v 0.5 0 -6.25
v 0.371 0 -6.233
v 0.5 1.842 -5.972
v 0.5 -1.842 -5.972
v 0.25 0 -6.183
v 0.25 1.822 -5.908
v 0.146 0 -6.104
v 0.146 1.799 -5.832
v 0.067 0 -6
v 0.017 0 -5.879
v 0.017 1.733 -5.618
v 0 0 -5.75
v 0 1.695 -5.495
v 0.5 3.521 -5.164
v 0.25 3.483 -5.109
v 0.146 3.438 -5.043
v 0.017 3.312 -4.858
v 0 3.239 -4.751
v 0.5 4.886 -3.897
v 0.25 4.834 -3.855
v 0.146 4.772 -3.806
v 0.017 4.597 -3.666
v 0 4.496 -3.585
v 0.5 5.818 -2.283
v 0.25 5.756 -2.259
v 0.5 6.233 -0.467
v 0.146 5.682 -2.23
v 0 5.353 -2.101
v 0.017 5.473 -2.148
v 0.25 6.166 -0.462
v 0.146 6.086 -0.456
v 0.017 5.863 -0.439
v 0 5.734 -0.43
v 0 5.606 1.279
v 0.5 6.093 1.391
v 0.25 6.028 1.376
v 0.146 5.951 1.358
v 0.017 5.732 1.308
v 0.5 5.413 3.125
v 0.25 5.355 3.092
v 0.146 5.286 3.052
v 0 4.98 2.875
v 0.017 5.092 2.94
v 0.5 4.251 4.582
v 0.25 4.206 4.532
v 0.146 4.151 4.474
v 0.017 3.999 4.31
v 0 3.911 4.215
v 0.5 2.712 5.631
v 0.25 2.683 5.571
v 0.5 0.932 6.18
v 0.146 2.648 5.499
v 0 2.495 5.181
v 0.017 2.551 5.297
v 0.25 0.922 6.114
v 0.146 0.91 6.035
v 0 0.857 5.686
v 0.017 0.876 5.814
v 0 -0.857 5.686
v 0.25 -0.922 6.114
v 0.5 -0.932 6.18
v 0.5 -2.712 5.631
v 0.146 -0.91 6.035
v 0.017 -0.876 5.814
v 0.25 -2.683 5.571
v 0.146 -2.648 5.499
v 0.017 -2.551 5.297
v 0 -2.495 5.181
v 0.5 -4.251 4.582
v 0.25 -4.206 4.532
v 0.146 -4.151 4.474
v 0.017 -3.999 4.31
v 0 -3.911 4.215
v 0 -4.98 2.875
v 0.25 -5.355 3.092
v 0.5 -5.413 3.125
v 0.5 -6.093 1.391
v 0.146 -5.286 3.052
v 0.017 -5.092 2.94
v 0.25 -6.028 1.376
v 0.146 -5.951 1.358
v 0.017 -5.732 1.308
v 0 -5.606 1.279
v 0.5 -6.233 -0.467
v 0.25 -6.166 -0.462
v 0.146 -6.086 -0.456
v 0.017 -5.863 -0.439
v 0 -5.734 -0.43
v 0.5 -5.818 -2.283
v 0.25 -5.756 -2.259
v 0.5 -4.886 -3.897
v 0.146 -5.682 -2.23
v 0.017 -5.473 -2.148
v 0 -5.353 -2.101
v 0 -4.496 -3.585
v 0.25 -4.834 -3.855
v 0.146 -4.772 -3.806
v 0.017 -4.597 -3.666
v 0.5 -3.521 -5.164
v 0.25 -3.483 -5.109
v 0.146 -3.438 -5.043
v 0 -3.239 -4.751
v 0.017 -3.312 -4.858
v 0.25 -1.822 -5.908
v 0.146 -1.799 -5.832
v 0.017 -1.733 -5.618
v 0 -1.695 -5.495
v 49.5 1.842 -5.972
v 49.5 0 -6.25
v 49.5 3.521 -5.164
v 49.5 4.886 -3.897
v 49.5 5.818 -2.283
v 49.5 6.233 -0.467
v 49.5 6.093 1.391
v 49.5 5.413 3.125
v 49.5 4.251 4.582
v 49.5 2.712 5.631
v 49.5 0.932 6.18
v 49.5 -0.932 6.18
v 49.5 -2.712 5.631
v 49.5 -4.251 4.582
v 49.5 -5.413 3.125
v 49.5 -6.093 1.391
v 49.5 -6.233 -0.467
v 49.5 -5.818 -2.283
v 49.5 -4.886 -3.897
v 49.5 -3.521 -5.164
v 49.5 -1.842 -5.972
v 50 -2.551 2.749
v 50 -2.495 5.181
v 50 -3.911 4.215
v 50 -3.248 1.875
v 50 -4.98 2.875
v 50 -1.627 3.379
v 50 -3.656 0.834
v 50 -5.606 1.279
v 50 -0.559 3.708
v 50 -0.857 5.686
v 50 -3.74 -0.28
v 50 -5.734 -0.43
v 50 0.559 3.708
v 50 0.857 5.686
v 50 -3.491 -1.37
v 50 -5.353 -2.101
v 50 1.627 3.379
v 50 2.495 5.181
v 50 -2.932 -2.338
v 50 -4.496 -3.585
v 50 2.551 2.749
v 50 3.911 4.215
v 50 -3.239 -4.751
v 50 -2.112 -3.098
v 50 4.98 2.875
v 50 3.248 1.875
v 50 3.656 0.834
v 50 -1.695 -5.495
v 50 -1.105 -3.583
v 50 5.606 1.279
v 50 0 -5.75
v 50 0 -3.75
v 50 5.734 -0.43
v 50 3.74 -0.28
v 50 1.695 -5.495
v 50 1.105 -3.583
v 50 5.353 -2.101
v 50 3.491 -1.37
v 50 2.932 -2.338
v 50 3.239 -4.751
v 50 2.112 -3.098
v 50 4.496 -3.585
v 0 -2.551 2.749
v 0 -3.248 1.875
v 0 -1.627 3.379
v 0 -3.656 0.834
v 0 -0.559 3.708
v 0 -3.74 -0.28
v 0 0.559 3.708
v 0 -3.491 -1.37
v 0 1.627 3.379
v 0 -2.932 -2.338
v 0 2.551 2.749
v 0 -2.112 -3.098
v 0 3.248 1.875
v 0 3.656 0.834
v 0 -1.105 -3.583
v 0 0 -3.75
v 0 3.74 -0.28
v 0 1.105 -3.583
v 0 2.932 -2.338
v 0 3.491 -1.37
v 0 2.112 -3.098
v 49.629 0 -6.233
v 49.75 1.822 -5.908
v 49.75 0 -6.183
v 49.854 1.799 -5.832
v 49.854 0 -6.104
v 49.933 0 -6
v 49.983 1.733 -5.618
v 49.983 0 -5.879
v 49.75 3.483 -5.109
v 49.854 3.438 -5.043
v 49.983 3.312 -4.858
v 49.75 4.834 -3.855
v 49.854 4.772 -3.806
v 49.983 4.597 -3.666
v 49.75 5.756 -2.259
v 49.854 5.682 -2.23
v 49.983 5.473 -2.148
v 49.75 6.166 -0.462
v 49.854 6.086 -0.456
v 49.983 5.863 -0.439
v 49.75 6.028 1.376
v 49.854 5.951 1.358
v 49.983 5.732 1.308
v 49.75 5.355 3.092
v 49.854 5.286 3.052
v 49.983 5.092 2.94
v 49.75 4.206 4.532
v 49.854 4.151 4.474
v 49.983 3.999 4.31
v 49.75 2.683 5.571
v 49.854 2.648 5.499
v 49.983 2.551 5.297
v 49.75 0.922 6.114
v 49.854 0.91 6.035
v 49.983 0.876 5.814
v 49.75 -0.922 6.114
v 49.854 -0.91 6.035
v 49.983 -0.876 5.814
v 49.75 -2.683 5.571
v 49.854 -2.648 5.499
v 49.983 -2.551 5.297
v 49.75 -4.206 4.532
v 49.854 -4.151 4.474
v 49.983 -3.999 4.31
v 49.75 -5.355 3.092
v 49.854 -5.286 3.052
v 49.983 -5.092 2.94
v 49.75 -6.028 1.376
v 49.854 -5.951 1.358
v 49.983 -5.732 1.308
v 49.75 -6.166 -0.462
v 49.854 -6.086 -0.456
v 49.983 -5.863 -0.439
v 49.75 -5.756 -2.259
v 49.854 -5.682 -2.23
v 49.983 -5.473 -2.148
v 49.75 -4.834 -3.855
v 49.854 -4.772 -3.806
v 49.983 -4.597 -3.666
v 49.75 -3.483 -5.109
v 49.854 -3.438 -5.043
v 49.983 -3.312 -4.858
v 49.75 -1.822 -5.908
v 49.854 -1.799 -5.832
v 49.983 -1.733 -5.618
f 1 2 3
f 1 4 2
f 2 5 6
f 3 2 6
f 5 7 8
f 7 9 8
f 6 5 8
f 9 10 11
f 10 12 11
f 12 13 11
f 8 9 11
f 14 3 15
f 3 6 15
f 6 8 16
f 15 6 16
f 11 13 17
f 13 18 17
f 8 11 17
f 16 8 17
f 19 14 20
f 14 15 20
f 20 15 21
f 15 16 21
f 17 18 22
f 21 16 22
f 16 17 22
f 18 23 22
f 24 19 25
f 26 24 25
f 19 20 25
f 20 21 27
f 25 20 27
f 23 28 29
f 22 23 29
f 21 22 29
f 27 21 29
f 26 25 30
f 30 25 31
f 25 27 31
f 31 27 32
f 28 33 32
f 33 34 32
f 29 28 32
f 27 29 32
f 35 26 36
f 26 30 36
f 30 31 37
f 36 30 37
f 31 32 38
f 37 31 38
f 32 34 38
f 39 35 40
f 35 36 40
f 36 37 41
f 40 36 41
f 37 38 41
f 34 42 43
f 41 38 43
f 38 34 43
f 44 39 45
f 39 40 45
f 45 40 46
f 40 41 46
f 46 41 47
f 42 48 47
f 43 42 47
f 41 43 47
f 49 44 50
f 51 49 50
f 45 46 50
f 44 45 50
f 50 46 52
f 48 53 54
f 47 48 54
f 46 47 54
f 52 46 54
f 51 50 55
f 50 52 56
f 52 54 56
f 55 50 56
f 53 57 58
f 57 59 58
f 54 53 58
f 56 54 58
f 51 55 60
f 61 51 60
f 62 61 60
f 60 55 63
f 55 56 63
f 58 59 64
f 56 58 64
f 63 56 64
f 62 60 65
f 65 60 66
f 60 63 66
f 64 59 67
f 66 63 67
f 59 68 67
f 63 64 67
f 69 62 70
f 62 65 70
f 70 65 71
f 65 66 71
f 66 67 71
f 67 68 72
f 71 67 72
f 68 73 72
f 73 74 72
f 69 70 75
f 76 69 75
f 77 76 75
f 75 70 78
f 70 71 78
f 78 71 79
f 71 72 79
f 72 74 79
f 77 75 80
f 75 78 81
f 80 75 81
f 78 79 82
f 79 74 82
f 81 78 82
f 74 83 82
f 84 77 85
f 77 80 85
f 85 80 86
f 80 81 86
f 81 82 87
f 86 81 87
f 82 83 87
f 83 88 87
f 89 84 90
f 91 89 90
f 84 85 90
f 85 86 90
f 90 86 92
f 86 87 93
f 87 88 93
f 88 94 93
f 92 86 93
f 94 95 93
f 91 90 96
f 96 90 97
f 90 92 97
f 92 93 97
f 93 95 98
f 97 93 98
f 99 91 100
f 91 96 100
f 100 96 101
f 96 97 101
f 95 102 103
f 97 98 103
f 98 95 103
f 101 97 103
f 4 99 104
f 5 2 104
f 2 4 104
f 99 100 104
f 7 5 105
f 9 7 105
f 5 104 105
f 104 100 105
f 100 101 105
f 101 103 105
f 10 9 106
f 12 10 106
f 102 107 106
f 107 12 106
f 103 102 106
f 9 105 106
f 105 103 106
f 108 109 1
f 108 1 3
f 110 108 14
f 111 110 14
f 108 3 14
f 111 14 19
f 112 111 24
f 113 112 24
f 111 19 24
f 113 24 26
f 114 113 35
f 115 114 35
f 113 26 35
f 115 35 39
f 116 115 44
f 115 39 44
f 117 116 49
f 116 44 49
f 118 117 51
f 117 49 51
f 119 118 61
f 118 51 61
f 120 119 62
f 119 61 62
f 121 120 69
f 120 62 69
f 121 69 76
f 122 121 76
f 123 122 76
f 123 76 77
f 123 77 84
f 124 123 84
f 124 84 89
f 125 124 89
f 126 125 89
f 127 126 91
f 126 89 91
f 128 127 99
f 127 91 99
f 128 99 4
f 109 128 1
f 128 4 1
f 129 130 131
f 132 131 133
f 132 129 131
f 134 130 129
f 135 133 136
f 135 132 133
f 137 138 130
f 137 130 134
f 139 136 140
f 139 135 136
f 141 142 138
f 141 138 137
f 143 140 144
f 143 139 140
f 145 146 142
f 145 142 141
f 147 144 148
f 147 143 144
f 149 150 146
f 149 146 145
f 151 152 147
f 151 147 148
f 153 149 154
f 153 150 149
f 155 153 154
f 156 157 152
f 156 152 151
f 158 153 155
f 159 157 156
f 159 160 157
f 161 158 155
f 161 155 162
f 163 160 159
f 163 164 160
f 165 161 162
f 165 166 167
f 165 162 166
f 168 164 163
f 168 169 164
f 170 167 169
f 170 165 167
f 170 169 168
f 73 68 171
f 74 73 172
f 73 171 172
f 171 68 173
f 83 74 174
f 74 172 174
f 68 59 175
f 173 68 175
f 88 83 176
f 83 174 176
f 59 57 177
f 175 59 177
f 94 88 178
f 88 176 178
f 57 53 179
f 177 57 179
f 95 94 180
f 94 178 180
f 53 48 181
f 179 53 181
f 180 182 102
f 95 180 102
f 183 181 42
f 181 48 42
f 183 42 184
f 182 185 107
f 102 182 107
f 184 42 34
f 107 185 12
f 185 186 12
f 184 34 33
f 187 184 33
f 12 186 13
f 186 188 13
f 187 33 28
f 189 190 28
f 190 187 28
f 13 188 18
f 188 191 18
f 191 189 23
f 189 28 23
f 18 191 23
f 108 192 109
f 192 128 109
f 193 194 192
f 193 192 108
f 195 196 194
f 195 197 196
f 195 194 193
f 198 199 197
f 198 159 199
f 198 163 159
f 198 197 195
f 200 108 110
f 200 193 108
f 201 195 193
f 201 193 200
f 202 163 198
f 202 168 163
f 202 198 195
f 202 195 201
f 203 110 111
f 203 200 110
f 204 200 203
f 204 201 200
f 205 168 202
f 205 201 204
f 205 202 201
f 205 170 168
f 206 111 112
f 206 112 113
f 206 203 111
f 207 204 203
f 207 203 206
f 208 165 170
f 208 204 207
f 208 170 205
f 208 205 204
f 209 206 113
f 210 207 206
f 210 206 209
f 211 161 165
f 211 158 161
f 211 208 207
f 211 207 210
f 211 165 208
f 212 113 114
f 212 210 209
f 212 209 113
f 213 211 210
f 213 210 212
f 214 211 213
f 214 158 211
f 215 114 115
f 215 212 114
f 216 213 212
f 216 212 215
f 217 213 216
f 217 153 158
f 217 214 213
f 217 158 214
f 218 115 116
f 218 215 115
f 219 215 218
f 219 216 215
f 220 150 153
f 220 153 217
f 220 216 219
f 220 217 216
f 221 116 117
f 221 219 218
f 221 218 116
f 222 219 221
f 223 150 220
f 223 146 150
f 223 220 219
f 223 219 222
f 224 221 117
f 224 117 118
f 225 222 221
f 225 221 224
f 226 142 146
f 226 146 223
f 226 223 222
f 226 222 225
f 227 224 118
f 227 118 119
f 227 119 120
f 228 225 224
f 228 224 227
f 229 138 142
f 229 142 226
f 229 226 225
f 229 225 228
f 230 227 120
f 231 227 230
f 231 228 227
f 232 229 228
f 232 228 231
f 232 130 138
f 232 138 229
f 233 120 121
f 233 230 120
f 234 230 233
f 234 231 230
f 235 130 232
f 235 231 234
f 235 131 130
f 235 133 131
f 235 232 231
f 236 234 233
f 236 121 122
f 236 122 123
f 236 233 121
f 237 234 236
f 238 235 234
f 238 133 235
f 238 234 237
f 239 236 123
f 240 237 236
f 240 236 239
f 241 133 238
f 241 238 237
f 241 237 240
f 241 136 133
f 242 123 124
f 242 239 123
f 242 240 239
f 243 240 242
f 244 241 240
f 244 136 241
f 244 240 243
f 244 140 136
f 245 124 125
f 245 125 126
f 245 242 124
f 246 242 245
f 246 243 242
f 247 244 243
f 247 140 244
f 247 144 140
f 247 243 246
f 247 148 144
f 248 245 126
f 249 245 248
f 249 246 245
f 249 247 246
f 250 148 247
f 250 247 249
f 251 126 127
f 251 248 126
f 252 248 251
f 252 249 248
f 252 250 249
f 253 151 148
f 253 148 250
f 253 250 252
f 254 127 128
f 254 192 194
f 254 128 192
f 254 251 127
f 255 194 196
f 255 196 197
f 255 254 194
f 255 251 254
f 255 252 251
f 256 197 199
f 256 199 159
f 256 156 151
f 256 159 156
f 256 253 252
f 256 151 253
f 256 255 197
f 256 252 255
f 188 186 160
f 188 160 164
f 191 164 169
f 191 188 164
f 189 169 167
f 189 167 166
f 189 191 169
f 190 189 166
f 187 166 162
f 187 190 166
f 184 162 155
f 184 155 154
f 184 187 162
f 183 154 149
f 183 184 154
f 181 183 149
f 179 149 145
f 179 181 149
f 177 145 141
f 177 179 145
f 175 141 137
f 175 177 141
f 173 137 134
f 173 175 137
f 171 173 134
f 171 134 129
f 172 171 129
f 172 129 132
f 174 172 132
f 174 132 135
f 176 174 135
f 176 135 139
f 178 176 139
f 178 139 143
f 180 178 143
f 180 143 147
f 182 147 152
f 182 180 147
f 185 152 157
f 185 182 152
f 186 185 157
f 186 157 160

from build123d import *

# Parameters (mm, degrees)
SKETCH1_R           = 6.25
SKETCH1_R_2         = 3.75
BOSS_EXTRUDE2_DEPTH = 50
FILLET1_R           = 0.5
FILLET2_R           = 0.5


with BuildPart() as part:
    # Sketch1 → Boss-Extrude2 (new body)
    with BuildSketch(Plane(origin=(0, 0, 0), x_dir=(0, 0, -1), z_dir=(1, 0, 0))):
        Circle(SKETCH1_R)
        Circle(SKETCH1_R_2, mode=Mode.SUBTRACT)
    extrude(amount=BOSS_EXTRUDE2_DEPTH)

    # Fillet1
    fillet1_edges = [part.edges().sort_by_distance(p)[0] for p in [
        (0, 0, 6.25),
    ]]
    fillet(fillet1_edges, radius=FILLET1_R)

    # Fillet2
    fillet2_edges = [part.edges().sort_by_distance(p)[0] for p in [
        (50, 0, 6.25),
    ]]
    fillet(fillet2_edges, radius=FILLET2_R)


solid = part.part
